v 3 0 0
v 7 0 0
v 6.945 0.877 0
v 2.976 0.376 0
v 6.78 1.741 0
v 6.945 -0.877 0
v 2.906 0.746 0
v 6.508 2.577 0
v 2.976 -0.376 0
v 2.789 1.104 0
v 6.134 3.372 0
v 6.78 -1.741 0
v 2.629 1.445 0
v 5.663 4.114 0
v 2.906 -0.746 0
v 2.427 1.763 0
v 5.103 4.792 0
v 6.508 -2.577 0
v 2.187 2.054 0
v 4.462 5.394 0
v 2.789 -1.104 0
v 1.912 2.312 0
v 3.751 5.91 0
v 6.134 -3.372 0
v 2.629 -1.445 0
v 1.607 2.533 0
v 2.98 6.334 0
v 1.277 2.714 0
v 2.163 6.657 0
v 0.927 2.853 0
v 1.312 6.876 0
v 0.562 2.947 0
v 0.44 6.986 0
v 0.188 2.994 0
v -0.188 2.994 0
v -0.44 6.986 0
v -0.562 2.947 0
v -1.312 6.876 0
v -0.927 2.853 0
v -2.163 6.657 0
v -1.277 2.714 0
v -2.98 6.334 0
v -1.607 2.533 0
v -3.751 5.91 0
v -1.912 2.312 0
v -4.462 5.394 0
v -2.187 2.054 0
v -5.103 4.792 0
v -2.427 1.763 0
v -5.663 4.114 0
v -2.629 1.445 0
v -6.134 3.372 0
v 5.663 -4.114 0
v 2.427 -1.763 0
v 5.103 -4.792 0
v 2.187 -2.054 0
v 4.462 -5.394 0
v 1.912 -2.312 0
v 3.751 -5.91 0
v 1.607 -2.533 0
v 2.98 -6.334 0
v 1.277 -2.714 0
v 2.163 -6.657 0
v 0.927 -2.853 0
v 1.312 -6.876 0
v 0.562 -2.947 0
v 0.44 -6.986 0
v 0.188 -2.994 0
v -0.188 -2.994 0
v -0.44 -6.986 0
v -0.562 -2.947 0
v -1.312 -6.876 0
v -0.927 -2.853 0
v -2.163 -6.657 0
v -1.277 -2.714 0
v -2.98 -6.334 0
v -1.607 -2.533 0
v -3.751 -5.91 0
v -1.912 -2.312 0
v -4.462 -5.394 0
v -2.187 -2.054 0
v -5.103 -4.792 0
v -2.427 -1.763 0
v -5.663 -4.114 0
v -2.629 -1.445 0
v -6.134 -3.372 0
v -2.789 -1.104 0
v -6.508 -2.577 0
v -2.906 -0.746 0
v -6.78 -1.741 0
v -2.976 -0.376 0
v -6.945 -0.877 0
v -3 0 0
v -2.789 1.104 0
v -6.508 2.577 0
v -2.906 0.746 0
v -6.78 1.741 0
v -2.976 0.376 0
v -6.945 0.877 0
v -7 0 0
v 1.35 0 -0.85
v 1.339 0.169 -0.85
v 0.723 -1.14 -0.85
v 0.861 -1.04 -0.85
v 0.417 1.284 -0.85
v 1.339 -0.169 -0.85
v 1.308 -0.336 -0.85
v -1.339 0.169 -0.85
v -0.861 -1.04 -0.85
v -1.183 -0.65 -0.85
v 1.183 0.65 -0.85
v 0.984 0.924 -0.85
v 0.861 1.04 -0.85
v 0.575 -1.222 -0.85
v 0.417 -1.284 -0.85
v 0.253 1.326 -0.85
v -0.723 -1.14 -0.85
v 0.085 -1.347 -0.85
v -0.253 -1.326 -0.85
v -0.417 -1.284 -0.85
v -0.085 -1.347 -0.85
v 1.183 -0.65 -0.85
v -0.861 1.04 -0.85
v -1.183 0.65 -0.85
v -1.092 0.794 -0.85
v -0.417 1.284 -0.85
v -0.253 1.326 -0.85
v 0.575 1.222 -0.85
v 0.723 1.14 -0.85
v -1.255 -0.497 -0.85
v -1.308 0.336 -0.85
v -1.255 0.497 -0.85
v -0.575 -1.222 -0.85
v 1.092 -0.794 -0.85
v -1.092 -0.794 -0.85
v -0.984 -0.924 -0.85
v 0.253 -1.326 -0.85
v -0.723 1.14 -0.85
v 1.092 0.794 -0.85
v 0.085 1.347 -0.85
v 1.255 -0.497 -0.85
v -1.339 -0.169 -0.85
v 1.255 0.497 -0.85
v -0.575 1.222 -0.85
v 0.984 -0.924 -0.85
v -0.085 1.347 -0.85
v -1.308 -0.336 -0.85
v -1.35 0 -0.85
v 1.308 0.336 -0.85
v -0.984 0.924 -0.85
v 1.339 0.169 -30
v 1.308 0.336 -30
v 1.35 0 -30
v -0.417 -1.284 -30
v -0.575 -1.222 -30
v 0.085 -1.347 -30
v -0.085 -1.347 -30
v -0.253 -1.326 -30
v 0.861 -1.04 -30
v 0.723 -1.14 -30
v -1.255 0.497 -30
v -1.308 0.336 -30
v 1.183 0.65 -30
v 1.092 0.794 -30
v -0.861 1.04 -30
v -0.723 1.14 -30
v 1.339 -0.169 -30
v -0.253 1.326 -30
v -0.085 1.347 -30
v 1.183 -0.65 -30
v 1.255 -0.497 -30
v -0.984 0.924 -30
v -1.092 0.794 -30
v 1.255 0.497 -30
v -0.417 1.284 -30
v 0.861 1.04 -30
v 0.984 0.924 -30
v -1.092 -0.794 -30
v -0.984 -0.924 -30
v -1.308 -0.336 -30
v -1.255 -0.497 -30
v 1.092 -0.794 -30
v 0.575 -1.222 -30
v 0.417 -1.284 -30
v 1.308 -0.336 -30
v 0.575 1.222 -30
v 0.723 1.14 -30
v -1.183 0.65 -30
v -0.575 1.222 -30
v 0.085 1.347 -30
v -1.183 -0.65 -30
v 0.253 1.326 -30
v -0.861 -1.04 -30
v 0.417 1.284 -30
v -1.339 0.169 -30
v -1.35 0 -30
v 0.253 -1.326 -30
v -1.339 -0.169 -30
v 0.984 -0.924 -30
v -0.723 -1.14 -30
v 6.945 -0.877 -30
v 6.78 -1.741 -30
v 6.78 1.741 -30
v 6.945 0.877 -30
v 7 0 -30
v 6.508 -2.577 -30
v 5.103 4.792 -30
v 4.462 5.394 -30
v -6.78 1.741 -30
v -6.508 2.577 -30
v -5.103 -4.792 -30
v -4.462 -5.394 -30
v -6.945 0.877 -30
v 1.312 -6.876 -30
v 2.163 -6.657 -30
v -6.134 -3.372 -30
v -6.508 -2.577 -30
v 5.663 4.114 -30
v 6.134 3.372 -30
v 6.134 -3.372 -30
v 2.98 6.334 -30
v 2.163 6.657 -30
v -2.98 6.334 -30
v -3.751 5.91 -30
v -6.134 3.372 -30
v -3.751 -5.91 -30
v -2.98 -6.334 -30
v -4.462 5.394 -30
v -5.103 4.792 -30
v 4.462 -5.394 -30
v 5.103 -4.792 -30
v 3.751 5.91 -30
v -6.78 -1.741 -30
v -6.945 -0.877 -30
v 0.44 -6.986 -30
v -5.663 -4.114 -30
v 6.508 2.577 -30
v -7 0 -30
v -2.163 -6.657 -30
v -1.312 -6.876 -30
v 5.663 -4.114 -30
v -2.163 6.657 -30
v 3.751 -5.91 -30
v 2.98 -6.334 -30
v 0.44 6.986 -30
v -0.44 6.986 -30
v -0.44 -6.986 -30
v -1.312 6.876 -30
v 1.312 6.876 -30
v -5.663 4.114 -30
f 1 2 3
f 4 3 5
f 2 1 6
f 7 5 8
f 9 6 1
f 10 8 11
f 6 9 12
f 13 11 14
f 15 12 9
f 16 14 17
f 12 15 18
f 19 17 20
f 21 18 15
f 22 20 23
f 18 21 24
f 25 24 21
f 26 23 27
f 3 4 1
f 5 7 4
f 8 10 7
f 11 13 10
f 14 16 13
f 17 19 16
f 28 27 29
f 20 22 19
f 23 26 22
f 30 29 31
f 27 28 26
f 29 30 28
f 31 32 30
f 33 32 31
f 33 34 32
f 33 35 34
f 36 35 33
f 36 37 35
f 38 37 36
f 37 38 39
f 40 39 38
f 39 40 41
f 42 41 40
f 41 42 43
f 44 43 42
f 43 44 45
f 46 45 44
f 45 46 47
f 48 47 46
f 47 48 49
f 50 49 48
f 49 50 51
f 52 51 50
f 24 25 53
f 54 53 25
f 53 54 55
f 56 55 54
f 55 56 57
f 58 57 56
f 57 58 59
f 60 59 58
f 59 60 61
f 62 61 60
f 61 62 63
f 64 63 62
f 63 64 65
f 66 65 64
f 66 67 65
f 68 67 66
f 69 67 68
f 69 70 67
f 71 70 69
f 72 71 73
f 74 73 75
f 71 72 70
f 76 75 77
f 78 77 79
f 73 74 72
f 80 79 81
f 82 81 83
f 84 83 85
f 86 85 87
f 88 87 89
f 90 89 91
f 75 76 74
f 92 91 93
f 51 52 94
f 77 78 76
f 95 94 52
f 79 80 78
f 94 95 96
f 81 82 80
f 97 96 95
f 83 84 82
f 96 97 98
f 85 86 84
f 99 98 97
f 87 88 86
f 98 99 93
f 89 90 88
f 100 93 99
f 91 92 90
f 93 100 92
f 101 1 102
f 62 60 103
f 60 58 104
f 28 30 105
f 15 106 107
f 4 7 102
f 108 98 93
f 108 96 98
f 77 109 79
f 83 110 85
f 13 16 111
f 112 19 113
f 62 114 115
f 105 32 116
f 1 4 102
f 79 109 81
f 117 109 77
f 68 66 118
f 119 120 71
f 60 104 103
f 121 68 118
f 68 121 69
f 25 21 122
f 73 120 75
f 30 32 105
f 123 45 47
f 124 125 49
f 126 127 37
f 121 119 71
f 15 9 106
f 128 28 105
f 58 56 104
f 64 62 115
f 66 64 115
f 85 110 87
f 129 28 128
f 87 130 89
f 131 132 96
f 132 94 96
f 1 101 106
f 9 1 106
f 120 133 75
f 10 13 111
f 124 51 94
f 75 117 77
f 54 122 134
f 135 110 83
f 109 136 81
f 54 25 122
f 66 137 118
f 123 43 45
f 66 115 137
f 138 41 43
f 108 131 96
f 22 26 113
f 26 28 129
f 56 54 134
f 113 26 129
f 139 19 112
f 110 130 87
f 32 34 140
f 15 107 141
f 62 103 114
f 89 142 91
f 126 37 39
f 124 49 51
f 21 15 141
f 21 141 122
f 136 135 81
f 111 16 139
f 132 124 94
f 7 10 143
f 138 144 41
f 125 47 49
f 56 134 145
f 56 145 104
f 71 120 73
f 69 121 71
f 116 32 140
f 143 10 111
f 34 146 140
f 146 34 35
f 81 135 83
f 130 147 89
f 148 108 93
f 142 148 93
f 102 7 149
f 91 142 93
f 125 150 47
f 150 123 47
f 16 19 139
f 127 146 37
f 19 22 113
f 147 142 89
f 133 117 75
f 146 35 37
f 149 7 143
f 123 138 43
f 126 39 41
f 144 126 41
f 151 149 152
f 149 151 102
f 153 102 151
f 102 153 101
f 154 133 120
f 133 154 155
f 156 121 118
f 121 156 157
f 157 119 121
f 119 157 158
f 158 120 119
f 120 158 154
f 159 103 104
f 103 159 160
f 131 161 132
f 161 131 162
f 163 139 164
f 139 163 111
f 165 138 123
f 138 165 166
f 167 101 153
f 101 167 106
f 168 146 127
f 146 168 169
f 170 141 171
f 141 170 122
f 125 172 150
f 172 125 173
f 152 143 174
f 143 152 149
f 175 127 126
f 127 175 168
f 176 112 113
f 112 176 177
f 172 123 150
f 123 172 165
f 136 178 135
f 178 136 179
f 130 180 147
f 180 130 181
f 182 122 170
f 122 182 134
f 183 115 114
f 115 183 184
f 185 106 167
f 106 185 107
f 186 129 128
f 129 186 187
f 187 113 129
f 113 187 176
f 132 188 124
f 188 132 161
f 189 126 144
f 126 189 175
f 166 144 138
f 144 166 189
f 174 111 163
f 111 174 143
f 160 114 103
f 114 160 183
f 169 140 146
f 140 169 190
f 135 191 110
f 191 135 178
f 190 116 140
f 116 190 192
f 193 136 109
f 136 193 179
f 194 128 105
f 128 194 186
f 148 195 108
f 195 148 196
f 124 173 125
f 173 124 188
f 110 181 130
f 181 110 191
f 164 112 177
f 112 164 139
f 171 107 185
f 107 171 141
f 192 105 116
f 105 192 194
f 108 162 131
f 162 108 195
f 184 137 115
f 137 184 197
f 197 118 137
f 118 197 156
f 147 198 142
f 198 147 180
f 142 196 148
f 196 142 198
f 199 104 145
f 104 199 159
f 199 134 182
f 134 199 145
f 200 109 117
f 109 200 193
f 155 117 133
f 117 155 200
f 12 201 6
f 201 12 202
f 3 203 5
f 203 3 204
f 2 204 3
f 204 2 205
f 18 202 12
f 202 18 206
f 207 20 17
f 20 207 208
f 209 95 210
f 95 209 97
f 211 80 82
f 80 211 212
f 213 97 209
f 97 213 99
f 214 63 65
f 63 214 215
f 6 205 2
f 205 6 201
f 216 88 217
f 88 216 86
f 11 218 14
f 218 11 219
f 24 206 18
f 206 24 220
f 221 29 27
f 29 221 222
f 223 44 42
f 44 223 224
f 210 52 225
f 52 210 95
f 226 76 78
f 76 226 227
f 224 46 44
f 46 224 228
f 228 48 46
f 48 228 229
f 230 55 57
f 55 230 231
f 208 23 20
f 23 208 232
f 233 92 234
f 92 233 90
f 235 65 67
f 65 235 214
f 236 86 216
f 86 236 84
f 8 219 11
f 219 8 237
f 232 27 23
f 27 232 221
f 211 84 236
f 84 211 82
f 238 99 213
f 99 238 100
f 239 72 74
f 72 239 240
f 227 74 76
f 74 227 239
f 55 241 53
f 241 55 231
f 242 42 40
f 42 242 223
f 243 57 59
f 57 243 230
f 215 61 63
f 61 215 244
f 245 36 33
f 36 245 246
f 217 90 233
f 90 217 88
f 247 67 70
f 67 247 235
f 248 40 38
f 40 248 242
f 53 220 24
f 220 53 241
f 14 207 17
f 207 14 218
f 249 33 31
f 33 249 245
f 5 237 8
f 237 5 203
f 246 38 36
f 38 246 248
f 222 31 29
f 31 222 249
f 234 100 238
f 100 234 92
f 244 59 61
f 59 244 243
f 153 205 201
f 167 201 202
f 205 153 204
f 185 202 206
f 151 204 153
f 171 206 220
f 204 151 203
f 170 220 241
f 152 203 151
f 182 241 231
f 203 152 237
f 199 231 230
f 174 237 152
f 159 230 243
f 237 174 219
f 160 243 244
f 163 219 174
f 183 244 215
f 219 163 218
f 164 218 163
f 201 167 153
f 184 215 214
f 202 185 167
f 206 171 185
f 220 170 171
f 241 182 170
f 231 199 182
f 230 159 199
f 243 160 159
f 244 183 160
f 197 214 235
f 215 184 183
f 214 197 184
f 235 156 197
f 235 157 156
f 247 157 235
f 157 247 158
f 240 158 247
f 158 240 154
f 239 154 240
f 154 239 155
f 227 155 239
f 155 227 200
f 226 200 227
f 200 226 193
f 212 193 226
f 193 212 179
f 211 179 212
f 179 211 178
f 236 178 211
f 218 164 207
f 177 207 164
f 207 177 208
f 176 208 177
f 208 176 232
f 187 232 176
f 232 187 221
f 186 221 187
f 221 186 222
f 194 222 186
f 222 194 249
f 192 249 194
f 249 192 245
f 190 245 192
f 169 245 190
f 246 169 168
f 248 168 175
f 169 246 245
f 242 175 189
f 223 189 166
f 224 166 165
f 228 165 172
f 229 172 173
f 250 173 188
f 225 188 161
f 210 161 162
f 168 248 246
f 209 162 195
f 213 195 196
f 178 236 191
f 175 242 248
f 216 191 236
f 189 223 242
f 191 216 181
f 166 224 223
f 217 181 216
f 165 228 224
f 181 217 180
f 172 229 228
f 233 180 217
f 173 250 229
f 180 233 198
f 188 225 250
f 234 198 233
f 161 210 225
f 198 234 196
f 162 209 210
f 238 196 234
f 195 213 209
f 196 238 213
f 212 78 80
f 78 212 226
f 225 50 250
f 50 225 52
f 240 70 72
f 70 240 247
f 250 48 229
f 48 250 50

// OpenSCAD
$fn = 50;

difference() {
	union() {
		translate(v = [0, 0, -30.0]) {
			cylinder(h = 30, r = 7.0);
		}
	}
	union() {
		translate(v = [0, 0, 0]) {
			rotate(a = [0, 0, 0]) {
				difference() {
					union() {
						translate(v = [0, 0, -33.0]) {
							cylinder(h = 33, r = 1.0);
						}
						translate(v = [0, 0, -0.85]) {
							cylinder(h = 0.85, r1 = 1.35, r2 = 3.0);
						}
						translate(v = [0, 0, -33.0]) {
							cylinder(h = 33, r = 1.35);
						}
						translate(v = [0, 0, -33.0]) {
							cylinder(h = 33, r = 1.0);
						}
					}
					union();
				}
			}
		}
	}
}
